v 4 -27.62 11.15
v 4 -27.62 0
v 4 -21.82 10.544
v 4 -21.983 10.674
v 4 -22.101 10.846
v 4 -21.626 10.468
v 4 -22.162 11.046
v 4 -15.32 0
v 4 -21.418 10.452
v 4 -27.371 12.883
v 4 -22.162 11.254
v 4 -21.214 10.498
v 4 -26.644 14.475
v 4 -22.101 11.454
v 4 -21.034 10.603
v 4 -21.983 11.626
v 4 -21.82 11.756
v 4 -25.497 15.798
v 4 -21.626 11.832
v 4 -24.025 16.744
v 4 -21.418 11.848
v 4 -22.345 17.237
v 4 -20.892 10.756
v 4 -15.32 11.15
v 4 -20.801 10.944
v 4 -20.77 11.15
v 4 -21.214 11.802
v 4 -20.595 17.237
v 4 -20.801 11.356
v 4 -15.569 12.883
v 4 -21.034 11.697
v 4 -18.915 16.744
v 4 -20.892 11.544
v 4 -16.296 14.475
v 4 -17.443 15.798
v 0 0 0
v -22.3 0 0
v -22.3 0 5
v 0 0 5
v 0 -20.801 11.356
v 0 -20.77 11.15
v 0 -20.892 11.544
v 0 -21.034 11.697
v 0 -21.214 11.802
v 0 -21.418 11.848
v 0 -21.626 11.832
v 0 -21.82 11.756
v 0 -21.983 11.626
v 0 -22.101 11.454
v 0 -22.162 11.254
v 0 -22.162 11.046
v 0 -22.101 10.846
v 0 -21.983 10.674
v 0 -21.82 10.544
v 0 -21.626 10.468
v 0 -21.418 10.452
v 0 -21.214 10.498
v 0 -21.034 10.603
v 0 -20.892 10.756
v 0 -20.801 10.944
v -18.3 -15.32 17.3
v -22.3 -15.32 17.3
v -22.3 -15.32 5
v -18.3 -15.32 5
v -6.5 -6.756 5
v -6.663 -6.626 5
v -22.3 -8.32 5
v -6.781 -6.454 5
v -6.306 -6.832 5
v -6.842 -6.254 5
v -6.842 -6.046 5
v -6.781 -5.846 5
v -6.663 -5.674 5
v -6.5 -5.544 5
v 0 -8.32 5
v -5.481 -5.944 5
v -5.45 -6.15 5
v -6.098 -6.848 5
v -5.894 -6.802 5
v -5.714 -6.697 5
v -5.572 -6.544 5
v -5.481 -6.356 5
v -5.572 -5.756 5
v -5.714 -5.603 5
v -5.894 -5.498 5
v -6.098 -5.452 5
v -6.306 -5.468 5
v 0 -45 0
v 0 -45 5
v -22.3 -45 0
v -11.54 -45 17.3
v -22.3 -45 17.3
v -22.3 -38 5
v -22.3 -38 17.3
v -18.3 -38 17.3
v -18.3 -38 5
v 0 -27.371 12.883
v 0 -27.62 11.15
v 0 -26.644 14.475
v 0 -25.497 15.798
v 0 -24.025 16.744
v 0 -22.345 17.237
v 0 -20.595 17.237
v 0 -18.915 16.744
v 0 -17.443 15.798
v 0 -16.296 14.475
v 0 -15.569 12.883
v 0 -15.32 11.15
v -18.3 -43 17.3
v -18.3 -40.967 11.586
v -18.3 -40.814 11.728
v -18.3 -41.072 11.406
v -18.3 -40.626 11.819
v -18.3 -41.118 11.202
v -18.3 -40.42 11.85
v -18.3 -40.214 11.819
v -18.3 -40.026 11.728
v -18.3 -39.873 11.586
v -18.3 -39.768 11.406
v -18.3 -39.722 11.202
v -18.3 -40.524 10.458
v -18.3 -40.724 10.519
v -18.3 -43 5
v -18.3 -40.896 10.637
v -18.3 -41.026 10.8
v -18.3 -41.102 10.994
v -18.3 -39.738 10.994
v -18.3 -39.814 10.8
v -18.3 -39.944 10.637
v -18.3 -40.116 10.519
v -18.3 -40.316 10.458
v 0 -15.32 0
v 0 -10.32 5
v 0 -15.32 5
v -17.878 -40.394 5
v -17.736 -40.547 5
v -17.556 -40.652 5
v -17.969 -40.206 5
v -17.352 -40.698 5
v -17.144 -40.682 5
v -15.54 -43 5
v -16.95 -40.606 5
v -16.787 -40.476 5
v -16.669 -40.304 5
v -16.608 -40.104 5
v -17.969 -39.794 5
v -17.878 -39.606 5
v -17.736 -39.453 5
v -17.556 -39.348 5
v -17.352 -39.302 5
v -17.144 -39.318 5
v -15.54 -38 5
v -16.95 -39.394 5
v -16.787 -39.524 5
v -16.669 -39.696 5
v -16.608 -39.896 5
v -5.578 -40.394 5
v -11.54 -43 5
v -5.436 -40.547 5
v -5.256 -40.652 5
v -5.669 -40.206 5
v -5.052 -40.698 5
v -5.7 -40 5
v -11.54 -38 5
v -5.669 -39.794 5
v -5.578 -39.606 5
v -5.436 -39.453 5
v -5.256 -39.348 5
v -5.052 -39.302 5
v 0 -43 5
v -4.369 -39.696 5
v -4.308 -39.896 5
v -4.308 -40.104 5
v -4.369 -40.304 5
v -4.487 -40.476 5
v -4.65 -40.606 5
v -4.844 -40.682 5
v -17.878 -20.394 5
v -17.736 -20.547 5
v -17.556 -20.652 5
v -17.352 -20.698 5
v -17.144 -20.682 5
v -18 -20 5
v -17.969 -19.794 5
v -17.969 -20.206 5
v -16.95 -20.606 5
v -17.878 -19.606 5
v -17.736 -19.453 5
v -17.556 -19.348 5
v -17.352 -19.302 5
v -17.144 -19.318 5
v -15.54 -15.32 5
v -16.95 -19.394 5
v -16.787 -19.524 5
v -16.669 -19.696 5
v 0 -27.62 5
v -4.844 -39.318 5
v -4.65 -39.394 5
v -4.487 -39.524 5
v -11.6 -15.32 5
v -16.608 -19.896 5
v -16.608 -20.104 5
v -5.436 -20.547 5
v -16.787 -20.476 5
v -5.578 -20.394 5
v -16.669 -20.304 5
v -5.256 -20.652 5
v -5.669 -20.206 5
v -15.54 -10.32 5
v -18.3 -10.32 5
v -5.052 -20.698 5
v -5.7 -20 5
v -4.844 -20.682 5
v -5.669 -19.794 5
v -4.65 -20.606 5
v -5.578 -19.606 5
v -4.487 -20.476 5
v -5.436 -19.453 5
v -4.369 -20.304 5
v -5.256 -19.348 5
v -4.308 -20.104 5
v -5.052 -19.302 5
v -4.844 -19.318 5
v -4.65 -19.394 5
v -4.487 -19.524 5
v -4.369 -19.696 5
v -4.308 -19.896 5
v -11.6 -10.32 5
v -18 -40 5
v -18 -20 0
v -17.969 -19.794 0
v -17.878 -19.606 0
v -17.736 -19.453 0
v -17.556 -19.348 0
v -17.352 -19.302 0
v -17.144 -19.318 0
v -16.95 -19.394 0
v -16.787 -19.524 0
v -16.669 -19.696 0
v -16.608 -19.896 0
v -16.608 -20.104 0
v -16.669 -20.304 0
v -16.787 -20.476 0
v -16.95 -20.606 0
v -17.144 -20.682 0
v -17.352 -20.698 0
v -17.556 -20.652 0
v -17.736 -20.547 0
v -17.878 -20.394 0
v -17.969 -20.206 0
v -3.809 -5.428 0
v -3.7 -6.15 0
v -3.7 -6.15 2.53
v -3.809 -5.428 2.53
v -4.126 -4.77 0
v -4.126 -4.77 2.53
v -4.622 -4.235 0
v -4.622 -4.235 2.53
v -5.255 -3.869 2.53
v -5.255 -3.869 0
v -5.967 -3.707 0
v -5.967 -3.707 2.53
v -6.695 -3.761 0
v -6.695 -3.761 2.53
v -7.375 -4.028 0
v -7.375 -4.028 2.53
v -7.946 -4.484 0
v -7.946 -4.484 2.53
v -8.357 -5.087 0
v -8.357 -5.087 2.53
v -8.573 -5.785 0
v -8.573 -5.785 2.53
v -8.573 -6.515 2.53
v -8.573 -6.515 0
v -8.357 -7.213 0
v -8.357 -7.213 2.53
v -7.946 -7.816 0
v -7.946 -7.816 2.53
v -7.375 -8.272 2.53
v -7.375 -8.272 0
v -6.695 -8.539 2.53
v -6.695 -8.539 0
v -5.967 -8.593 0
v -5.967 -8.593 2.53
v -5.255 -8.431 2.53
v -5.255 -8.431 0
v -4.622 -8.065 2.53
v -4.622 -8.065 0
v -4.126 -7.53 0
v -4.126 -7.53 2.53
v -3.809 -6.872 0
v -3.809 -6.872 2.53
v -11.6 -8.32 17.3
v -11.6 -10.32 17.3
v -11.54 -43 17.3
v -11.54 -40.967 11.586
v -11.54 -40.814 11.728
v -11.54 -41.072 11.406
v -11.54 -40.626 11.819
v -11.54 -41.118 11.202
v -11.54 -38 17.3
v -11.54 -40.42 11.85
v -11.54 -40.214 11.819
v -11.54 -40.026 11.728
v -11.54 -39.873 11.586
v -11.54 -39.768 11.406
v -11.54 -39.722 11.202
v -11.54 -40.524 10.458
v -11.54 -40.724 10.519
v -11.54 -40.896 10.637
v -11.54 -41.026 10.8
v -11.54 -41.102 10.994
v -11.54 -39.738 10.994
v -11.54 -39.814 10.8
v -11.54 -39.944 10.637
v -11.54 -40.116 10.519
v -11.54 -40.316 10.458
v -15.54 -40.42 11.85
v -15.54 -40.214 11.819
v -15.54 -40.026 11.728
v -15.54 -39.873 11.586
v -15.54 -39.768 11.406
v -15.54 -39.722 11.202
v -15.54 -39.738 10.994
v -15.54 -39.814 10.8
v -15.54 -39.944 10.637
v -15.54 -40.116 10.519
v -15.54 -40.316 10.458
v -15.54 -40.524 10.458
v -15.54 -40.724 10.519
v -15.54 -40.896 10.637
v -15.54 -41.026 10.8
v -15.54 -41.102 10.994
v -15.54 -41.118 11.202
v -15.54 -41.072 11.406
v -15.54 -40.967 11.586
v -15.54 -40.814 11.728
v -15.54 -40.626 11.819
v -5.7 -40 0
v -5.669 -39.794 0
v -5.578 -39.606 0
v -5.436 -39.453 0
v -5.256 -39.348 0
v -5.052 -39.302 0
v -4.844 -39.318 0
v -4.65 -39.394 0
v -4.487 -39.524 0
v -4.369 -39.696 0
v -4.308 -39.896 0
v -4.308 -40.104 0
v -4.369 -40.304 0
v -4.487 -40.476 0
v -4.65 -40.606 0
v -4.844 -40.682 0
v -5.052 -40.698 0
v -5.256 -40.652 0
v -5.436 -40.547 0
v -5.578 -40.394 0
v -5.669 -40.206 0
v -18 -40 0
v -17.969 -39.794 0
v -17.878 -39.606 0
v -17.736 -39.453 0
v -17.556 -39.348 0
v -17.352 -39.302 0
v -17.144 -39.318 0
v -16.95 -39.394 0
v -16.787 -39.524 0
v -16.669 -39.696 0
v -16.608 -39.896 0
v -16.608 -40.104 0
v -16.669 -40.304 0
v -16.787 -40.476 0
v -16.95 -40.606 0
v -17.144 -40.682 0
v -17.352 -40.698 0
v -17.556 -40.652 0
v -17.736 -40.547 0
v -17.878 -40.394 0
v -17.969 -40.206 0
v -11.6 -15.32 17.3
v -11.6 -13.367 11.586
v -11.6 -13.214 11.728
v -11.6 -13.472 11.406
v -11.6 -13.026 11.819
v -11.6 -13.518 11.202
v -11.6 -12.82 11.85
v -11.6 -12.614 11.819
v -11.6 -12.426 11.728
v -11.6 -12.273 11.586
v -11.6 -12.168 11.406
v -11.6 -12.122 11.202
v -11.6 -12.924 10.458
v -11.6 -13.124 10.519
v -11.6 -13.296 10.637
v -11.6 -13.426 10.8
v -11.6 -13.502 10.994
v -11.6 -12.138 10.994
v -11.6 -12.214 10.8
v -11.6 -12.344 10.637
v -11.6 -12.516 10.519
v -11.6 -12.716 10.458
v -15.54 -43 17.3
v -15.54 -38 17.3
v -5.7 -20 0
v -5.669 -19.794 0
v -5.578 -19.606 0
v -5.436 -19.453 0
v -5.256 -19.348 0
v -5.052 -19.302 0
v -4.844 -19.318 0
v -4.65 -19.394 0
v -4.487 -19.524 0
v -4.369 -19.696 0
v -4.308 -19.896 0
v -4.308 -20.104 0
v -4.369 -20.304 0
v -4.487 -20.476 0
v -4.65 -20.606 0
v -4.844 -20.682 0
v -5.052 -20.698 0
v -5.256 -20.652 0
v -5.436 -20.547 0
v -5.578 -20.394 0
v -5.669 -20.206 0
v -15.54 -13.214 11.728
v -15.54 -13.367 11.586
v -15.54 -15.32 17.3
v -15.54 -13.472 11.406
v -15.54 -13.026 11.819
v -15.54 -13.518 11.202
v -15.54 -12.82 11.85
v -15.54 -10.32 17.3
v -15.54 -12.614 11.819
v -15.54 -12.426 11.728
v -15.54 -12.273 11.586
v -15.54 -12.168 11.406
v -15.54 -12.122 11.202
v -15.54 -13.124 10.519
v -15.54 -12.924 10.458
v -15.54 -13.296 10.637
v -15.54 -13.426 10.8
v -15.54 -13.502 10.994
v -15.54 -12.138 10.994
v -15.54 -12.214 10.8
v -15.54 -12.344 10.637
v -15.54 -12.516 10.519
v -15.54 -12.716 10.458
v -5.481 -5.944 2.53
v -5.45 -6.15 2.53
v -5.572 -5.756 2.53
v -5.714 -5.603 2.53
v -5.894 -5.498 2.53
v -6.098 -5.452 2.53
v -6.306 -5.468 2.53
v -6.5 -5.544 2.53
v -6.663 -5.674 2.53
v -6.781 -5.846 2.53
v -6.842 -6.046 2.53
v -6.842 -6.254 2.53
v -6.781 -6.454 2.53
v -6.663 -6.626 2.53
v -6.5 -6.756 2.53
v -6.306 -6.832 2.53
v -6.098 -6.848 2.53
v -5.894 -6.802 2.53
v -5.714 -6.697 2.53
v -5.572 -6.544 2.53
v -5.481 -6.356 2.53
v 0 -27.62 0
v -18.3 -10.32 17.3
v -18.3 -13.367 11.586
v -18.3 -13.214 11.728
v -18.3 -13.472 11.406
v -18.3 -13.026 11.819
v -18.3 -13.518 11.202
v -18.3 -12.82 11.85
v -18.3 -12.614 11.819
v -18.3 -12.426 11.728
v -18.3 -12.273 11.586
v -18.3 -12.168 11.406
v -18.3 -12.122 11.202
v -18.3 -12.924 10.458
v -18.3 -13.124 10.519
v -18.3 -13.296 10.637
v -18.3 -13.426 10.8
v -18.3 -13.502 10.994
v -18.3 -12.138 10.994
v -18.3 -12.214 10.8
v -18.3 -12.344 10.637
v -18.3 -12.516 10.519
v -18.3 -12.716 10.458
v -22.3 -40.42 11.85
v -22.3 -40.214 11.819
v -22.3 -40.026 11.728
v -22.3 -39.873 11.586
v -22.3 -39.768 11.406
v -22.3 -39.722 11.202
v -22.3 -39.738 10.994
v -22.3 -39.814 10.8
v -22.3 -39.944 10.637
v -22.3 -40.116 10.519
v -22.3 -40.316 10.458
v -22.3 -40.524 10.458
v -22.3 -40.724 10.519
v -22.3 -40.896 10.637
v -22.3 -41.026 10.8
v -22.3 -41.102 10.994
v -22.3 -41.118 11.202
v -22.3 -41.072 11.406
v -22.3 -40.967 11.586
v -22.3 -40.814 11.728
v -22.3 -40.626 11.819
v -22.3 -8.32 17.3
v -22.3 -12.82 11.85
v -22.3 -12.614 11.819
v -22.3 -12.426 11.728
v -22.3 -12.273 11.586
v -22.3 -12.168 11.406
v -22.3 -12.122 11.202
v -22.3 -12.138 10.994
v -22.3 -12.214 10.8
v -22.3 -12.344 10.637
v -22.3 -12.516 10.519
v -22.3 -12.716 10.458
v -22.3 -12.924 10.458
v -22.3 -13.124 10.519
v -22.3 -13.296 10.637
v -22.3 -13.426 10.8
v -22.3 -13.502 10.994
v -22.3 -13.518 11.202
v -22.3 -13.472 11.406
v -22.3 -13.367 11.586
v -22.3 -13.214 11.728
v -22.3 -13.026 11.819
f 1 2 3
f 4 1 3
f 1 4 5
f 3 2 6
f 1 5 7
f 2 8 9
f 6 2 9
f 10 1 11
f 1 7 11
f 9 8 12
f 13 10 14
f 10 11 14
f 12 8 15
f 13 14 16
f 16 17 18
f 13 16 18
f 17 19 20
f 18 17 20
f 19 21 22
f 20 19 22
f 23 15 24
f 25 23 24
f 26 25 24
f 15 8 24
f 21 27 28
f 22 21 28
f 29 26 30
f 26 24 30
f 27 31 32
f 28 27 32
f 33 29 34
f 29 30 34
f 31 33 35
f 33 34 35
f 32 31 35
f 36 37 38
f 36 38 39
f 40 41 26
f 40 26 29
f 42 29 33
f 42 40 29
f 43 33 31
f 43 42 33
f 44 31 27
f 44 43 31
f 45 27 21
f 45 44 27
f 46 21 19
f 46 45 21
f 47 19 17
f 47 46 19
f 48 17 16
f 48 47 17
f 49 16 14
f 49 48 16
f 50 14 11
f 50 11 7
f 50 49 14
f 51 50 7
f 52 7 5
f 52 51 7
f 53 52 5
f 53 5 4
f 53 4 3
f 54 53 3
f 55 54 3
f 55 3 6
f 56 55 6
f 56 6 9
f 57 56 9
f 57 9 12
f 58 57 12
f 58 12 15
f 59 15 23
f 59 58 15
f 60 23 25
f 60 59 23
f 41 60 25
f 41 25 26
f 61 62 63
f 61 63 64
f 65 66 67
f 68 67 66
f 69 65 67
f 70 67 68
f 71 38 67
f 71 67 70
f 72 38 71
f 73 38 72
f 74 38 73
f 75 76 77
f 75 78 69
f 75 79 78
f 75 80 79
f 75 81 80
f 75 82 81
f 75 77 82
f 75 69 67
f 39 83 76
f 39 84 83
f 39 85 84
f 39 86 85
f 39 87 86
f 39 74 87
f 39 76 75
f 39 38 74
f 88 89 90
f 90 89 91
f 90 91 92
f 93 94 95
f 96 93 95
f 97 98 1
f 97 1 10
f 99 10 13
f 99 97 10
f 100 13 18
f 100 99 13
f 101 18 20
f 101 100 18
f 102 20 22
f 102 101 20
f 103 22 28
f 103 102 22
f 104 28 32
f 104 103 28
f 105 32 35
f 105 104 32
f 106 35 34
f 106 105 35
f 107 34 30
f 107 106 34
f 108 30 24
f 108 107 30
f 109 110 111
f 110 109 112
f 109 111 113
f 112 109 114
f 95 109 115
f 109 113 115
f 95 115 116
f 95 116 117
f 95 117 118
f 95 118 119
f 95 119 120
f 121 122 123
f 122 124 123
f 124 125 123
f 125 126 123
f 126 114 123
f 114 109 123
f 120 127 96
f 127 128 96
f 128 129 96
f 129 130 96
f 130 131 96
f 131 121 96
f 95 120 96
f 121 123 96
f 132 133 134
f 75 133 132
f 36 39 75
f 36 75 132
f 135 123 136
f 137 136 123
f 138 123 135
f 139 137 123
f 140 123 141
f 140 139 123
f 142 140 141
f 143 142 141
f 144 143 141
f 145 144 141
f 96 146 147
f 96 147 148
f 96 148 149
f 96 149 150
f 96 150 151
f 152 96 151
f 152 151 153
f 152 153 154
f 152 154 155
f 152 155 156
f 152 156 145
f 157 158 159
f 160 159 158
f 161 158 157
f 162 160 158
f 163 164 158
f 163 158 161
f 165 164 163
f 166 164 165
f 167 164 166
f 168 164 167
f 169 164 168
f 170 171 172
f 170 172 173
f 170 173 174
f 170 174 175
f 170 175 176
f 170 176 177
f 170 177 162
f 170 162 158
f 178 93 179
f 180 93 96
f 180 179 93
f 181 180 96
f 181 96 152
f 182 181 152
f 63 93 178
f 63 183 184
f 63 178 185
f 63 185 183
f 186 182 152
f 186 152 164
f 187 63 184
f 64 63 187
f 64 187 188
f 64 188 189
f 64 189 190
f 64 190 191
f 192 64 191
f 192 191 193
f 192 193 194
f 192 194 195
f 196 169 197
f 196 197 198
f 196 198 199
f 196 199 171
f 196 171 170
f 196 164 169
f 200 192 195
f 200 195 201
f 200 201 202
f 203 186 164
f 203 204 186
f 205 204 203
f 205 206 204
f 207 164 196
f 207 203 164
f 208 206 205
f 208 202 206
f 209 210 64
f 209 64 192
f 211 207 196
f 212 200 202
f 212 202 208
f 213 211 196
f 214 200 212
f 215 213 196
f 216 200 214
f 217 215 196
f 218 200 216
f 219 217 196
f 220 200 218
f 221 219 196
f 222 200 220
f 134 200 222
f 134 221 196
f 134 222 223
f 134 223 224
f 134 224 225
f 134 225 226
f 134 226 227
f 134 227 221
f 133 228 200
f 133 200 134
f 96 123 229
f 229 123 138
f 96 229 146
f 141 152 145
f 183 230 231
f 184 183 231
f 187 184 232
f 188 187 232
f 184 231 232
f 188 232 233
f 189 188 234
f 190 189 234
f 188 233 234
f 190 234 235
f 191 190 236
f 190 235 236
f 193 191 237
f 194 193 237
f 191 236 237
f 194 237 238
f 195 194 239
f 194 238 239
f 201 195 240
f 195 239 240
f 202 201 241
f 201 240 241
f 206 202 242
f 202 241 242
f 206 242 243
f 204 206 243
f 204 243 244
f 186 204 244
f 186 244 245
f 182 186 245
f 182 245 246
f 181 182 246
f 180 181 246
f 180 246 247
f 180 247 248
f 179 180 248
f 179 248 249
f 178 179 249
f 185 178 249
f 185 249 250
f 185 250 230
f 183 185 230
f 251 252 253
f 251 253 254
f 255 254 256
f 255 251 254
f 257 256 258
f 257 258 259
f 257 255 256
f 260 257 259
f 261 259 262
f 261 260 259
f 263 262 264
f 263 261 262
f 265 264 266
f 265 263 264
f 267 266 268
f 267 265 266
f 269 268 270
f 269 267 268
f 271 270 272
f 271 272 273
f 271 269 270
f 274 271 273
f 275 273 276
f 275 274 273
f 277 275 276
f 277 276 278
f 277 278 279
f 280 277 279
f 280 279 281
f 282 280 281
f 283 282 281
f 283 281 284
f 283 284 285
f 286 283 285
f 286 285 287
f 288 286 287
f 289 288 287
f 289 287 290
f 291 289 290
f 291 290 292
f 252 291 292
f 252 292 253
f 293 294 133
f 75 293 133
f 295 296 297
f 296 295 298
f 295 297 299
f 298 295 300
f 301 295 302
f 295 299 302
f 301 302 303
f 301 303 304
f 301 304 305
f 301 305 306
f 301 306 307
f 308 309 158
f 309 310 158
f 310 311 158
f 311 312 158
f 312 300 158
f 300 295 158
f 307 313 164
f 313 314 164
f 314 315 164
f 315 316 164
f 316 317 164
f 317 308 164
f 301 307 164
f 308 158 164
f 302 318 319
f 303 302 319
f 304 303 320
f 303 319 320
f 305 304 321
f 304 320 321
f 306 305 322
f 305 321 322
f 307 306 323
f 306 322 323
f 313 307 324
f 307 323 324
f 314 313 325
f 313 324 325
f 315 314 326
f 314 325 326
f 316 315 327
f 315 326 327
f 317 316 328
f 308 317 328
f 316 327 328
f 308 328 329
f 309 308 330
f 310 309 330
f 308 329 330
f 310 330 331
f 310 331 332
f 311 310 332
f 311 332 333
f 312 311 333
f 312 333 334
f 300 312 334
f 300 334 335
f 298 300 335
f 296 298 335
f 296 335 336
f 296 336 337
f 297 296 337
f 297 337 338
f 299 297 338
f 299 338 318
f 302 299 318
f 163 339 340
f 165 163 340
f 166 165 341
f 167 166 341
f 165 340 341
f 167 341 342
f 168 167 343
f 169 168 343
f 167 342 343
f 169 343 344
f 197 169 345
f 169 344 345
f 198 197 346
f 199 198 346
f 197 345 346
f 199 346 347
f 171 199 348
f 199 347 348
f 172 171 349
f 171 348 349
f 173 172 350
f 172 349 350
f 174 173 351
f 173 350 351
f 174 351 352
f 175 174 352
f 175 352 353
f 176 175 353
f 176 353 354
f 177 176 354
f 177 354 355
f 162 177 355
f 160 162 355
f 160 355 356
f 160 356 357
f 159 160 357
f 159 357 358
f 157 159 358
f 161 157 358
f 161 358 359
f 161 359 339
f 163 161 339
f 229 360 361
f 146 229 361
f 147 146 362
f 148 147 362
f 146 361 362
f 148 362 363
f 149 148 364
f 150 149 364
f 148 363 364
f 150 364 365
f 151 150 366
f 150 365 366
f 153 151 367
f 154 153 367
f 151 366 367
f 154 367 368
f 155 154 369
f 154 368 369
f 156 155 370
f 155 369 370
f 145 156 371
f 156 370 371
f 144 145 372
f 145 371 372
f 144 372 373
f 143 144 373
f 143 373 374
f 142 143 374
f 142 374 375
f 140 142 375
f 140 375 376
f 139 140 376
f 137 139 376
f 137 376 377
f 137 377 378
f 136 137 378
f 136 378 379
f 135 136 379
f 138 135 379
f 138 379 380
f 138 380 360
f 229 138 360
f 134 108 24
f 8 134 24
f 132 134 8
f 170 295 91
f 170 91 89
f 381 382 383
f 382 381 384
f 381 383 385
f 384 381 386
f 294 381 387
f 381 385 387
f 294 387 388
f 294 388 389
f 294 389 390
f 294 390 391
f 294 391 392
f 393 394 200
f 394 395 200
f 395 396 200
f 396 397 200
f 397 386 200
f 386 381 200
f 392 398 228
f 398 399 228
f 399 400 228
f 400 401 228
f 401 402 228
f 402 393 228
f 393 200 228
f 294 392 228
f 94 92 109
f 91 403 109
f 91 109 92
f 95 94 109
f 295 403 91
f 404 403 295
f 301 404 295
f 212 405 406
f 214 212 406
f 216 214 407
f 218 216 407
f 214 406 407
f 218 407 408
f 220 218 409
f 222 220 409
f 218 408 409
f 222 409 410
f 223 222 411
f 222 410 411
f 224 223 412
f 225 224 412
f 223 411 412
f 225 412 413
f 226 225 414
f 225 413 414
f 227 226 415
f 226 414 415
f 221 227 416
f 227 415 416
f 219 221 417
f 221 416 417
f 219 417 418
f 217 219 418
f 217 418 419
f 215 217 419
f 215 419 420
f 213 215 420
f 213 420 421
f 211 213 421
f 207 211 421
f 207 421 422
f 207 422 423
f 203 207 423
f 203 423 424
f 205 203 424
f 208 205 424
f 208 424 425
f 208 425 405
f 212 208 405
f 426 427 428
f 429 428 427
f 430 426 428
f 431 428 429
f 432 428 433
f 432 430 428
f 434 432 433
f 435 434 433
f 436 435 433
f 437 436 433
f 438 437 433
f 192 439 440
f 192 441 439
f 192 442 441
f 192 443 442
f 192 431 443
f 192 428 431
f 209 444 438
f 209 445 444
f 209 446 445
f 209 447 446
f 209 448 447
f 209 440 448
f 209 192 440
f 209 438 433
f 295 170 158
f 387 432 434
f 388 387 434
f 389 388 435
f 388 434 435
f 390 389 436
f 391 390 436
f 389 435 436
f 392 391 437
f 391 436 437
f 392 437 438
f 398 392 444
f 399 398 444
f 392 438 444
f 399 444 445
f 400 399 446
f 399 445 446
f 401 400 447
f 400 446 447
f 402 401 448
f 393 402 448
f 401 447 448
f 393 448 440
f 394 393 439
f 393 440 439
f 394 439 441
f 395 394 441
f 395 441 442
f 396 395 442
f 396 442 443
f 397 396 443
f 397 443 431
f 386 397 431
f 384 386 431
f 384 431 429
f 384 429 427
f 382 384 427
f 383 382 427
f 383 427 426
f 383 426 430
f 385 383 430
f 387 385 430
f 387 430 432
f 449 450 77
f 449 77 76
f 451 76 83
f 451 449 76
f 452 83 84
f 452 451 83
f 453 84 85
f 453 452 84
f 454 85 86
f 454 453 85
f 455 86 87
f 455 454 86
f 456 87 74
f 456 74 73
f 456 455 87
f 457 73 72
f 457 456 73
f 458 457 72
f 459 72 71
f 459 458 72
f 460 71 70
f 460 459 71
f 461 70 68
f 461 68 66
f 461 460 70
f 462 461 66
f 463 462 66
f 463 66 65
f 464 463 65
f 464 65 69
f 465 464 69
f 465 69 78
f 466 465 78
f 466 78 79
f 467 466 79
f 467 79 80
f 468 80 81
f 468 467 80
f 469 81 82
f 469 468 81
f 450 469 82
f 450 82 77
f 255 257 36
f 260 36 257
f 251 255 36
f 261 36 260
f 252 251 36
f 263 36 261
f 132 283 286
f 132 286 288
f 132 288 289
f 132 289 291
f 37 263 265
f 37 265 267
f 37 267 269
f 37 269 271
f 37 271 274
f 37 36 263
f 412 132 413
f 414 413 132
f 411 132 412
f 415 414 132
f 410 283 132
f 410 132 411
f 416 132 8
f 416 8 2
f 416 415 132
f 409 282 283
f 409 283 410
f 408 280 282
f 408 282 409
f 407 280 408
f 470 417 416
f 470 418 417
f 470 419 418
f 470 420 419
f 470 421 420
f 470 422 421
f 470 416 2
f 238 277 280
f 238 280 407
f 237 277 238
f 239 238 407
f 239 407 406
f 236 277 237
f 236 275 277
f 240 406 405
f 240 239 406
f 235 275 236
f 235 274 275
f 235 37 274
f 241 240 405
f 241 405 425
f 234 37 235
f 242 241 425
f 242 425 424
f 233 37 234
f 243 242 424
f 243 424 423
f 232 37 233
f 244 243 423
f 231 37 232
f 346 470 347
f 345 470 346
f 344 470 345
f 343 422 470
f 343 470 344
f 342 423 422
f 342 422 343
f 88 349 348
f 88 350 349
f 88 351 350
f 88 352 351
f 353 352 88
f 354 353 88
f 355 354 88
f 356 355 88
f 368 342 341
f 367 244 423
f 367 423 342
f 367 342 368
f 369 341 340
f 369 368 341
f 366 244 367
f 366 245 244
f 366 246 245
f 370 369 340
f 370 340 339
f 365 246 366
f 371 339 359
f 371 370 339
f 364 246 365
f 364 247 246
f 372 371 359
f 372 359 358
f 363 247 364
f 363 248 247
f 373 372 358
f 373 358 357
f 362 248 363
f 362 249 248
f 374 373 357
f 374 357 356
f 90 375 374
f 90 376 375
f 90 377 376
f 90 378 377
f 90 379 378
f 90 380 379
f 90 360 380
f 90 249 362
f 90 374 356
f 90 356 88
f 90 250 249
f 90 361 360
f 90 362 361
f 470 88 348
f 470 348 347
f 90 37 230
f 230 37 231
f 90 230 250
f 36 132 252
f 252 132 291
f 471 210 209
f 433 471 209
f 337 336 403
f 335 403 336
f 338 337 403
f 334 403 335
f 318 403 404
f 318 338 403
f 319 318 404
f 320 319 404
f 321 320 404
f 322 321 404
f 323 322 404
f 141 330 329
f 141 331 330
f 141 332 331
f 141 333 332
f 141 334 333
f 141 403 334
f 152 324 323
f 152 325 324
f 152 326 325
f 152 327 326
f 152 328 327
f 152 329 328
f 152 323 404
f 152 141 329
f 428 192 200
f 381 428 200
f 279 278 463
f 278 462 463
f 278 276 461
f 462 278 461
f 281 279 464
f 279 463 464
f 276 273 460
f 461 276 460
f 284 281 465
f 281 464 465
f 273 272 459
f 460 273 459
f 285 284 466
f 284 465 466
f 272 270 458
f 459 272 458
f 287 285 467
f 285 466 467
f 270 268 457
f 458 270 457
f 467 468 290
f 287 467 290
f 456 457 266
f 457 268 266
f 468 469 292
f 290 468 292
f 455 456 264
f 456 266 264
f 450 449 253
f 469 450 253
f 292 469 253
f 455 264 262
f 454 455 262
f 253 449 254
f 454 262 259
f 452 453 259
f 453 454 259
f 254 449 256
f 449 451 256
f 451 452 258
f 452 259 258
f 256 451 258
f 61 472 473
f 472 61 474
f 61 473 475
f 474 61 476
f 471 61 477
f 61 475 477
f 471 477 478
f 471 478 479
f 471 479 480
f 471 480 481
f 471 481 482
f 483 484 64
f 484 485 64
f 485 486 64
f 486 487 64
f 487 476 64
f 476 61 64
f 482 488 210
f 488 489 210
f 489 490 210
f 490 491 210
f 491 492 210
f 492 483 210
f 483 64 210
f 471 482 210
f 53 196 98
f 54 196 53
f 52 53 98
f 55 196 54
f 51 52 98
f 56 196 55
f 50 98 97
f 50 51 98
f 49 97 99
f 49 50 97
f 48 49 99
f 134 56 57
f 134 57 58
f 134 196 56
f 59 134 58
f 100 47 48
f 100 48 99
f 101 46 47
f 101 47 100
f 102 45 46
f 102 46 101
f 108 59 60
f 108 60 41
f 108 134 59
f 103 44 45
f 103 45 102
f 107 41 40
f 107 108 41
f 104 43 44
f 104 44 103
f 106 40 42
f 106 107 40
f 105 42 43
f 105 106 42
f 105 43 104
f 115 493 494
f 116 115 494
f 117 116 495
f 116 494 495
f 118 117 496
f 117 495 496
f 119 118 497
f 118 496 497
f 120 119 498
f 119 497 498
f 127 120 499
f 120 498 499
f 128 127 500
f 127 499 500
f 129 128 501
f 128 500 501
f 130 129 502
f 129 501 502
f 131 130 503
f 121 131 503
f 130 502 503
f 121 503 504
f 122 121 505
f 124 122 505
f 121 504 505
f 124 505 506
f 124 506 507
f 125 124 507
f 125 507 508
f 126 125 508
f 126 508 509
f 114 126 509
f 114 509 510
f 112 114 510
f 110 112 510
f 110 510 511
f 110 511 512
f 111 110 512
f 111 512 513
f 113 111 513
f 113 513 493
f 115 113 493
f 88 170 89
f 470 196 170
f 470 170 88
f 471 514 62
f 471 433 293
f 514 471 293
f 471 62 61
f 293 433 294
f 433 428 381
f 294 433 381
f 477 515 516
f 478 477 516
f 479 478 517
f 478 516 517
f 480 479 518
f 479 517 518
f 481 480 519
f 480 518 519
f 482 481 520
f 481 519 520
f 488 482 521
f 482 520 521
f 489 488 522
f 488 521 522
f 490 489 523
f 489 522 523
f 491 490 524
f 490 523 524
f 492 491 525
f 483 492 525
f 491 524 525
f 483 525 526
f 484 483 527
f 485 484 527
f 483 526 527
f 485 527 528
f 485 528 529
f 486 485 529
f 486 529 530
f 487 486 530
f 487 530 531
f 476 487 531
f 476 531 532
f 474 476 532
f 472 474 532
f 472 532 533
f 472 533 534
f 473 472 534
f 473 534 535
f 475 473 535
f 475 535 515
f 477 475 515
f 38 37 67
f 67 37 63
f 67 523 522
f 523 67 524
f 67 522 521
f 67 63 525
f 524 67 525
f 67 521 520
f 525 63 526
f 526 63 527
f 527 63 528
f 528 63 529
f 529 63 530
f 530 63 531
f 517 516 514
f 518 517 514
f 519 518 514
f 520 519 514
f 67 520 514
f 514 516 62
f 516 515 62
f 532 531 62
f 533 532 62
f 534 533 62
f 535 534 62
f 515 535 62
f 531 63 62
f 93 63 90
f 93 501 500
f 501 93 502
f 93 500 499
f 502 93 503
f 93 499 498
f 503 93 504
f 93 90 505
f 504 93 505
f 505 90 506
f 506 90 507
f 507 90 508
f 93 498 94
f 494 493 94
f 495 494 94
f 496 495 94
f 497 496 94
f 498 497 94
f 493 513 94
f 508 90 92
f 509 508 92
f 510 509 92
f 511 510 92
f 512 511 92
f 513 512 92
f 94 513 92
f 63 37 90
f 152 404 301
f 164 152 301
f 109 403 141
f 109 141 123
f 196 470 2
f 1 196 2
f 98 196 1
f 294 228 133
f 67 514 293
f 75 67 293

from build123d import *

# Parameters (mm, degrees)
ESQUISSE1_W             = 22.3
ESQUISSE1_H             = 43
ESQUISSE1_R             = 2.45
BOSS_EXTRU_1_DEPTH      = 5
BOSS_EXTRU_2_START      = -2.47
ESQUISSE2_R             = 2.45
ESQUISSE2_R_2           = 0.7
BOSS_EXTRU_2_DEPTH      = 2.47
ESQUISSE3_W             = 4
ESQUISSE3_H             = 5
ESQUISSE3_W_2           = 3.94
BOSS_EXTRU_3_DEPTH      = 12.3
ESQUISSE4_R             = 0.7
ENL_V_MAT_EXTRU_1_DEPTH = 52.435201954
BOSS_EXTRU_4_DEPTH      = 2
BOSS_EXTRU_5_DEPTH      = 2
ESQUISSE7_R             = 0.7
BOSS_EXTRU_6_DEPTH      = 4
ESQUISSE8_R             = 0.7
ENL_V_MAT_EXTRU_3_DEPTH = 54.118546667


with BuildPart() as part:
    # Esquisse1 → Boss.-Extru.1 (new body)
    with BuildSketch(Plane.XY):
        with Locations((-11.15, -21.5)):
            Rectangle(ESQUISSE1_W, ESQUISSE1_H)
        with Locations((-6.15, -6.15)):
            Circle(ESQUISSE1_R, mode=Mode.SUBTRACT)
    extrude(amount=BOSS_EXTRU_1_DEPTH)

    # Esquisse2 → Boss.-Extru.2 (add)
    with BuildSketch(Plane.XY.offset(5).offset(BOSS_EXTRU_2_START)):
        with Locations((-6.15, -6.15)):
            Circle(ESQUISSE2_R)
        with Locations((-6.15, -6.15)):
            Circle(ESQUISSE2_R_2, mode=Mode.SUBTRACT)
    extrude(amount=BOSS_EXTRU_2_DEPTH)

    # Esquisse3 → Boss.-Extru.3 (add)
    with BuildSketch(Plane.XY.offset(5)):
        with Locations((-20.3, -40.5)):
            Rectangle(ESQUISSE3_W, ESQUISSE3_H)
        with Locations((-13.54, -40.5)):
            Rectangle(ESQUISSE3_W, ESQUISSE3_H)
        with Locations((-20.3, -12.82)):
            Rectangle(ESQUISSE3_W, ESQUISSE3_H)
        with Locations((-13.57, -12.82)):
            Rectangle(ESQUISSE3_W_2, ESQUISSE3_H)
    extrude(amount=BOSS_EXTRU_3_DEPTH)

    # Esquisse4 → Enlèv. mat.-Extru.1 (cut, through all)
    with BuildSketch(Plane.ZY.offset(22.3)):
        with Locations((11.15, -12.82)):
            Circle(ESQUISSE4_R)
        with Locations((11.15, -40.42)):
            Circle(ESQUISSE4_R)
    extrude(amount=-ENL_V_MAT_EXTRU_1_DEPTH, mode=Mode.SUBTRACT)

    # Esquisse5 → Boss.-Extru.4 (add)
    with BuildSketch(Plane.XZ.offset(43)):
        Polygon((-22.3, 17.3), (-11.54, 17.3), (0, 5), (0, 0), (-22.3, 0), align=None)
    extrude(amount=BOSS_EXTRU_4_DEPTH)

    # Esquisse6 → Boss.-Extru.5 (add)
    with BuildSketch(Plane(origin=(0, -10.32, 0), x_dir=(1, 0, 0), z_dir=(0, 1, 0))):
        Polygon((-22.3, -5), (-22.3, -17.3), (-11.6, -17.3), (0, -5), align=None)
    extrude(amount=BOSS_EXTRU_5_DEPTH)

    # Esquisse7 → Boss.-Extru.6 (add)
    with BuildSketch(Plane(origin=(0, 0, 0), x_dir=(0, 0, -1), z_dir=(1, 0, 0))):
        with BuildLine():
            Line((-11.15, -15.32), (0, -15.32))
            Line((0, -15.32), (0, -27.62))
            Line((0, -27.62), (-11.15, -27.62))
            ThreePointArc((-11.15, -27.62), (-17.3, -21.47), (-11.15, -15.32))
        make_face()
        with Locations(Location((-11.15, -21.47, 0), (0, 0, 90))):
            Circle(ESQUISSE7_R, mode=Mode.SUBTRACT)
    extrude(amount=BOSS_EXTRU_6_DEPTH)

    # Esquisse8 → Enlèv. mat.-Extru.3 (cut, through all)
    with BuildSketch(Plane(origin=(0, 0, 0), x_dir=(-1, 0, 0), z_dir=(0, 0, -1))):
        with Locations((17.3, -40)):
            Circle(ESQUISSE8_R)
        with Locations((5, -40)):
            Circle(ESQUISSE8_R)
        with Locations((5, -20)):
            Circle(ESQUISSE8_R)
        with Locations((17.3, -20)):
            Circle(ESQUISSE8_R)
    extrude(amount=-ENL_V_MAT_EXTRU_3_DEPTH, mode=Mode.SUBTRACT)


solid = part.part
